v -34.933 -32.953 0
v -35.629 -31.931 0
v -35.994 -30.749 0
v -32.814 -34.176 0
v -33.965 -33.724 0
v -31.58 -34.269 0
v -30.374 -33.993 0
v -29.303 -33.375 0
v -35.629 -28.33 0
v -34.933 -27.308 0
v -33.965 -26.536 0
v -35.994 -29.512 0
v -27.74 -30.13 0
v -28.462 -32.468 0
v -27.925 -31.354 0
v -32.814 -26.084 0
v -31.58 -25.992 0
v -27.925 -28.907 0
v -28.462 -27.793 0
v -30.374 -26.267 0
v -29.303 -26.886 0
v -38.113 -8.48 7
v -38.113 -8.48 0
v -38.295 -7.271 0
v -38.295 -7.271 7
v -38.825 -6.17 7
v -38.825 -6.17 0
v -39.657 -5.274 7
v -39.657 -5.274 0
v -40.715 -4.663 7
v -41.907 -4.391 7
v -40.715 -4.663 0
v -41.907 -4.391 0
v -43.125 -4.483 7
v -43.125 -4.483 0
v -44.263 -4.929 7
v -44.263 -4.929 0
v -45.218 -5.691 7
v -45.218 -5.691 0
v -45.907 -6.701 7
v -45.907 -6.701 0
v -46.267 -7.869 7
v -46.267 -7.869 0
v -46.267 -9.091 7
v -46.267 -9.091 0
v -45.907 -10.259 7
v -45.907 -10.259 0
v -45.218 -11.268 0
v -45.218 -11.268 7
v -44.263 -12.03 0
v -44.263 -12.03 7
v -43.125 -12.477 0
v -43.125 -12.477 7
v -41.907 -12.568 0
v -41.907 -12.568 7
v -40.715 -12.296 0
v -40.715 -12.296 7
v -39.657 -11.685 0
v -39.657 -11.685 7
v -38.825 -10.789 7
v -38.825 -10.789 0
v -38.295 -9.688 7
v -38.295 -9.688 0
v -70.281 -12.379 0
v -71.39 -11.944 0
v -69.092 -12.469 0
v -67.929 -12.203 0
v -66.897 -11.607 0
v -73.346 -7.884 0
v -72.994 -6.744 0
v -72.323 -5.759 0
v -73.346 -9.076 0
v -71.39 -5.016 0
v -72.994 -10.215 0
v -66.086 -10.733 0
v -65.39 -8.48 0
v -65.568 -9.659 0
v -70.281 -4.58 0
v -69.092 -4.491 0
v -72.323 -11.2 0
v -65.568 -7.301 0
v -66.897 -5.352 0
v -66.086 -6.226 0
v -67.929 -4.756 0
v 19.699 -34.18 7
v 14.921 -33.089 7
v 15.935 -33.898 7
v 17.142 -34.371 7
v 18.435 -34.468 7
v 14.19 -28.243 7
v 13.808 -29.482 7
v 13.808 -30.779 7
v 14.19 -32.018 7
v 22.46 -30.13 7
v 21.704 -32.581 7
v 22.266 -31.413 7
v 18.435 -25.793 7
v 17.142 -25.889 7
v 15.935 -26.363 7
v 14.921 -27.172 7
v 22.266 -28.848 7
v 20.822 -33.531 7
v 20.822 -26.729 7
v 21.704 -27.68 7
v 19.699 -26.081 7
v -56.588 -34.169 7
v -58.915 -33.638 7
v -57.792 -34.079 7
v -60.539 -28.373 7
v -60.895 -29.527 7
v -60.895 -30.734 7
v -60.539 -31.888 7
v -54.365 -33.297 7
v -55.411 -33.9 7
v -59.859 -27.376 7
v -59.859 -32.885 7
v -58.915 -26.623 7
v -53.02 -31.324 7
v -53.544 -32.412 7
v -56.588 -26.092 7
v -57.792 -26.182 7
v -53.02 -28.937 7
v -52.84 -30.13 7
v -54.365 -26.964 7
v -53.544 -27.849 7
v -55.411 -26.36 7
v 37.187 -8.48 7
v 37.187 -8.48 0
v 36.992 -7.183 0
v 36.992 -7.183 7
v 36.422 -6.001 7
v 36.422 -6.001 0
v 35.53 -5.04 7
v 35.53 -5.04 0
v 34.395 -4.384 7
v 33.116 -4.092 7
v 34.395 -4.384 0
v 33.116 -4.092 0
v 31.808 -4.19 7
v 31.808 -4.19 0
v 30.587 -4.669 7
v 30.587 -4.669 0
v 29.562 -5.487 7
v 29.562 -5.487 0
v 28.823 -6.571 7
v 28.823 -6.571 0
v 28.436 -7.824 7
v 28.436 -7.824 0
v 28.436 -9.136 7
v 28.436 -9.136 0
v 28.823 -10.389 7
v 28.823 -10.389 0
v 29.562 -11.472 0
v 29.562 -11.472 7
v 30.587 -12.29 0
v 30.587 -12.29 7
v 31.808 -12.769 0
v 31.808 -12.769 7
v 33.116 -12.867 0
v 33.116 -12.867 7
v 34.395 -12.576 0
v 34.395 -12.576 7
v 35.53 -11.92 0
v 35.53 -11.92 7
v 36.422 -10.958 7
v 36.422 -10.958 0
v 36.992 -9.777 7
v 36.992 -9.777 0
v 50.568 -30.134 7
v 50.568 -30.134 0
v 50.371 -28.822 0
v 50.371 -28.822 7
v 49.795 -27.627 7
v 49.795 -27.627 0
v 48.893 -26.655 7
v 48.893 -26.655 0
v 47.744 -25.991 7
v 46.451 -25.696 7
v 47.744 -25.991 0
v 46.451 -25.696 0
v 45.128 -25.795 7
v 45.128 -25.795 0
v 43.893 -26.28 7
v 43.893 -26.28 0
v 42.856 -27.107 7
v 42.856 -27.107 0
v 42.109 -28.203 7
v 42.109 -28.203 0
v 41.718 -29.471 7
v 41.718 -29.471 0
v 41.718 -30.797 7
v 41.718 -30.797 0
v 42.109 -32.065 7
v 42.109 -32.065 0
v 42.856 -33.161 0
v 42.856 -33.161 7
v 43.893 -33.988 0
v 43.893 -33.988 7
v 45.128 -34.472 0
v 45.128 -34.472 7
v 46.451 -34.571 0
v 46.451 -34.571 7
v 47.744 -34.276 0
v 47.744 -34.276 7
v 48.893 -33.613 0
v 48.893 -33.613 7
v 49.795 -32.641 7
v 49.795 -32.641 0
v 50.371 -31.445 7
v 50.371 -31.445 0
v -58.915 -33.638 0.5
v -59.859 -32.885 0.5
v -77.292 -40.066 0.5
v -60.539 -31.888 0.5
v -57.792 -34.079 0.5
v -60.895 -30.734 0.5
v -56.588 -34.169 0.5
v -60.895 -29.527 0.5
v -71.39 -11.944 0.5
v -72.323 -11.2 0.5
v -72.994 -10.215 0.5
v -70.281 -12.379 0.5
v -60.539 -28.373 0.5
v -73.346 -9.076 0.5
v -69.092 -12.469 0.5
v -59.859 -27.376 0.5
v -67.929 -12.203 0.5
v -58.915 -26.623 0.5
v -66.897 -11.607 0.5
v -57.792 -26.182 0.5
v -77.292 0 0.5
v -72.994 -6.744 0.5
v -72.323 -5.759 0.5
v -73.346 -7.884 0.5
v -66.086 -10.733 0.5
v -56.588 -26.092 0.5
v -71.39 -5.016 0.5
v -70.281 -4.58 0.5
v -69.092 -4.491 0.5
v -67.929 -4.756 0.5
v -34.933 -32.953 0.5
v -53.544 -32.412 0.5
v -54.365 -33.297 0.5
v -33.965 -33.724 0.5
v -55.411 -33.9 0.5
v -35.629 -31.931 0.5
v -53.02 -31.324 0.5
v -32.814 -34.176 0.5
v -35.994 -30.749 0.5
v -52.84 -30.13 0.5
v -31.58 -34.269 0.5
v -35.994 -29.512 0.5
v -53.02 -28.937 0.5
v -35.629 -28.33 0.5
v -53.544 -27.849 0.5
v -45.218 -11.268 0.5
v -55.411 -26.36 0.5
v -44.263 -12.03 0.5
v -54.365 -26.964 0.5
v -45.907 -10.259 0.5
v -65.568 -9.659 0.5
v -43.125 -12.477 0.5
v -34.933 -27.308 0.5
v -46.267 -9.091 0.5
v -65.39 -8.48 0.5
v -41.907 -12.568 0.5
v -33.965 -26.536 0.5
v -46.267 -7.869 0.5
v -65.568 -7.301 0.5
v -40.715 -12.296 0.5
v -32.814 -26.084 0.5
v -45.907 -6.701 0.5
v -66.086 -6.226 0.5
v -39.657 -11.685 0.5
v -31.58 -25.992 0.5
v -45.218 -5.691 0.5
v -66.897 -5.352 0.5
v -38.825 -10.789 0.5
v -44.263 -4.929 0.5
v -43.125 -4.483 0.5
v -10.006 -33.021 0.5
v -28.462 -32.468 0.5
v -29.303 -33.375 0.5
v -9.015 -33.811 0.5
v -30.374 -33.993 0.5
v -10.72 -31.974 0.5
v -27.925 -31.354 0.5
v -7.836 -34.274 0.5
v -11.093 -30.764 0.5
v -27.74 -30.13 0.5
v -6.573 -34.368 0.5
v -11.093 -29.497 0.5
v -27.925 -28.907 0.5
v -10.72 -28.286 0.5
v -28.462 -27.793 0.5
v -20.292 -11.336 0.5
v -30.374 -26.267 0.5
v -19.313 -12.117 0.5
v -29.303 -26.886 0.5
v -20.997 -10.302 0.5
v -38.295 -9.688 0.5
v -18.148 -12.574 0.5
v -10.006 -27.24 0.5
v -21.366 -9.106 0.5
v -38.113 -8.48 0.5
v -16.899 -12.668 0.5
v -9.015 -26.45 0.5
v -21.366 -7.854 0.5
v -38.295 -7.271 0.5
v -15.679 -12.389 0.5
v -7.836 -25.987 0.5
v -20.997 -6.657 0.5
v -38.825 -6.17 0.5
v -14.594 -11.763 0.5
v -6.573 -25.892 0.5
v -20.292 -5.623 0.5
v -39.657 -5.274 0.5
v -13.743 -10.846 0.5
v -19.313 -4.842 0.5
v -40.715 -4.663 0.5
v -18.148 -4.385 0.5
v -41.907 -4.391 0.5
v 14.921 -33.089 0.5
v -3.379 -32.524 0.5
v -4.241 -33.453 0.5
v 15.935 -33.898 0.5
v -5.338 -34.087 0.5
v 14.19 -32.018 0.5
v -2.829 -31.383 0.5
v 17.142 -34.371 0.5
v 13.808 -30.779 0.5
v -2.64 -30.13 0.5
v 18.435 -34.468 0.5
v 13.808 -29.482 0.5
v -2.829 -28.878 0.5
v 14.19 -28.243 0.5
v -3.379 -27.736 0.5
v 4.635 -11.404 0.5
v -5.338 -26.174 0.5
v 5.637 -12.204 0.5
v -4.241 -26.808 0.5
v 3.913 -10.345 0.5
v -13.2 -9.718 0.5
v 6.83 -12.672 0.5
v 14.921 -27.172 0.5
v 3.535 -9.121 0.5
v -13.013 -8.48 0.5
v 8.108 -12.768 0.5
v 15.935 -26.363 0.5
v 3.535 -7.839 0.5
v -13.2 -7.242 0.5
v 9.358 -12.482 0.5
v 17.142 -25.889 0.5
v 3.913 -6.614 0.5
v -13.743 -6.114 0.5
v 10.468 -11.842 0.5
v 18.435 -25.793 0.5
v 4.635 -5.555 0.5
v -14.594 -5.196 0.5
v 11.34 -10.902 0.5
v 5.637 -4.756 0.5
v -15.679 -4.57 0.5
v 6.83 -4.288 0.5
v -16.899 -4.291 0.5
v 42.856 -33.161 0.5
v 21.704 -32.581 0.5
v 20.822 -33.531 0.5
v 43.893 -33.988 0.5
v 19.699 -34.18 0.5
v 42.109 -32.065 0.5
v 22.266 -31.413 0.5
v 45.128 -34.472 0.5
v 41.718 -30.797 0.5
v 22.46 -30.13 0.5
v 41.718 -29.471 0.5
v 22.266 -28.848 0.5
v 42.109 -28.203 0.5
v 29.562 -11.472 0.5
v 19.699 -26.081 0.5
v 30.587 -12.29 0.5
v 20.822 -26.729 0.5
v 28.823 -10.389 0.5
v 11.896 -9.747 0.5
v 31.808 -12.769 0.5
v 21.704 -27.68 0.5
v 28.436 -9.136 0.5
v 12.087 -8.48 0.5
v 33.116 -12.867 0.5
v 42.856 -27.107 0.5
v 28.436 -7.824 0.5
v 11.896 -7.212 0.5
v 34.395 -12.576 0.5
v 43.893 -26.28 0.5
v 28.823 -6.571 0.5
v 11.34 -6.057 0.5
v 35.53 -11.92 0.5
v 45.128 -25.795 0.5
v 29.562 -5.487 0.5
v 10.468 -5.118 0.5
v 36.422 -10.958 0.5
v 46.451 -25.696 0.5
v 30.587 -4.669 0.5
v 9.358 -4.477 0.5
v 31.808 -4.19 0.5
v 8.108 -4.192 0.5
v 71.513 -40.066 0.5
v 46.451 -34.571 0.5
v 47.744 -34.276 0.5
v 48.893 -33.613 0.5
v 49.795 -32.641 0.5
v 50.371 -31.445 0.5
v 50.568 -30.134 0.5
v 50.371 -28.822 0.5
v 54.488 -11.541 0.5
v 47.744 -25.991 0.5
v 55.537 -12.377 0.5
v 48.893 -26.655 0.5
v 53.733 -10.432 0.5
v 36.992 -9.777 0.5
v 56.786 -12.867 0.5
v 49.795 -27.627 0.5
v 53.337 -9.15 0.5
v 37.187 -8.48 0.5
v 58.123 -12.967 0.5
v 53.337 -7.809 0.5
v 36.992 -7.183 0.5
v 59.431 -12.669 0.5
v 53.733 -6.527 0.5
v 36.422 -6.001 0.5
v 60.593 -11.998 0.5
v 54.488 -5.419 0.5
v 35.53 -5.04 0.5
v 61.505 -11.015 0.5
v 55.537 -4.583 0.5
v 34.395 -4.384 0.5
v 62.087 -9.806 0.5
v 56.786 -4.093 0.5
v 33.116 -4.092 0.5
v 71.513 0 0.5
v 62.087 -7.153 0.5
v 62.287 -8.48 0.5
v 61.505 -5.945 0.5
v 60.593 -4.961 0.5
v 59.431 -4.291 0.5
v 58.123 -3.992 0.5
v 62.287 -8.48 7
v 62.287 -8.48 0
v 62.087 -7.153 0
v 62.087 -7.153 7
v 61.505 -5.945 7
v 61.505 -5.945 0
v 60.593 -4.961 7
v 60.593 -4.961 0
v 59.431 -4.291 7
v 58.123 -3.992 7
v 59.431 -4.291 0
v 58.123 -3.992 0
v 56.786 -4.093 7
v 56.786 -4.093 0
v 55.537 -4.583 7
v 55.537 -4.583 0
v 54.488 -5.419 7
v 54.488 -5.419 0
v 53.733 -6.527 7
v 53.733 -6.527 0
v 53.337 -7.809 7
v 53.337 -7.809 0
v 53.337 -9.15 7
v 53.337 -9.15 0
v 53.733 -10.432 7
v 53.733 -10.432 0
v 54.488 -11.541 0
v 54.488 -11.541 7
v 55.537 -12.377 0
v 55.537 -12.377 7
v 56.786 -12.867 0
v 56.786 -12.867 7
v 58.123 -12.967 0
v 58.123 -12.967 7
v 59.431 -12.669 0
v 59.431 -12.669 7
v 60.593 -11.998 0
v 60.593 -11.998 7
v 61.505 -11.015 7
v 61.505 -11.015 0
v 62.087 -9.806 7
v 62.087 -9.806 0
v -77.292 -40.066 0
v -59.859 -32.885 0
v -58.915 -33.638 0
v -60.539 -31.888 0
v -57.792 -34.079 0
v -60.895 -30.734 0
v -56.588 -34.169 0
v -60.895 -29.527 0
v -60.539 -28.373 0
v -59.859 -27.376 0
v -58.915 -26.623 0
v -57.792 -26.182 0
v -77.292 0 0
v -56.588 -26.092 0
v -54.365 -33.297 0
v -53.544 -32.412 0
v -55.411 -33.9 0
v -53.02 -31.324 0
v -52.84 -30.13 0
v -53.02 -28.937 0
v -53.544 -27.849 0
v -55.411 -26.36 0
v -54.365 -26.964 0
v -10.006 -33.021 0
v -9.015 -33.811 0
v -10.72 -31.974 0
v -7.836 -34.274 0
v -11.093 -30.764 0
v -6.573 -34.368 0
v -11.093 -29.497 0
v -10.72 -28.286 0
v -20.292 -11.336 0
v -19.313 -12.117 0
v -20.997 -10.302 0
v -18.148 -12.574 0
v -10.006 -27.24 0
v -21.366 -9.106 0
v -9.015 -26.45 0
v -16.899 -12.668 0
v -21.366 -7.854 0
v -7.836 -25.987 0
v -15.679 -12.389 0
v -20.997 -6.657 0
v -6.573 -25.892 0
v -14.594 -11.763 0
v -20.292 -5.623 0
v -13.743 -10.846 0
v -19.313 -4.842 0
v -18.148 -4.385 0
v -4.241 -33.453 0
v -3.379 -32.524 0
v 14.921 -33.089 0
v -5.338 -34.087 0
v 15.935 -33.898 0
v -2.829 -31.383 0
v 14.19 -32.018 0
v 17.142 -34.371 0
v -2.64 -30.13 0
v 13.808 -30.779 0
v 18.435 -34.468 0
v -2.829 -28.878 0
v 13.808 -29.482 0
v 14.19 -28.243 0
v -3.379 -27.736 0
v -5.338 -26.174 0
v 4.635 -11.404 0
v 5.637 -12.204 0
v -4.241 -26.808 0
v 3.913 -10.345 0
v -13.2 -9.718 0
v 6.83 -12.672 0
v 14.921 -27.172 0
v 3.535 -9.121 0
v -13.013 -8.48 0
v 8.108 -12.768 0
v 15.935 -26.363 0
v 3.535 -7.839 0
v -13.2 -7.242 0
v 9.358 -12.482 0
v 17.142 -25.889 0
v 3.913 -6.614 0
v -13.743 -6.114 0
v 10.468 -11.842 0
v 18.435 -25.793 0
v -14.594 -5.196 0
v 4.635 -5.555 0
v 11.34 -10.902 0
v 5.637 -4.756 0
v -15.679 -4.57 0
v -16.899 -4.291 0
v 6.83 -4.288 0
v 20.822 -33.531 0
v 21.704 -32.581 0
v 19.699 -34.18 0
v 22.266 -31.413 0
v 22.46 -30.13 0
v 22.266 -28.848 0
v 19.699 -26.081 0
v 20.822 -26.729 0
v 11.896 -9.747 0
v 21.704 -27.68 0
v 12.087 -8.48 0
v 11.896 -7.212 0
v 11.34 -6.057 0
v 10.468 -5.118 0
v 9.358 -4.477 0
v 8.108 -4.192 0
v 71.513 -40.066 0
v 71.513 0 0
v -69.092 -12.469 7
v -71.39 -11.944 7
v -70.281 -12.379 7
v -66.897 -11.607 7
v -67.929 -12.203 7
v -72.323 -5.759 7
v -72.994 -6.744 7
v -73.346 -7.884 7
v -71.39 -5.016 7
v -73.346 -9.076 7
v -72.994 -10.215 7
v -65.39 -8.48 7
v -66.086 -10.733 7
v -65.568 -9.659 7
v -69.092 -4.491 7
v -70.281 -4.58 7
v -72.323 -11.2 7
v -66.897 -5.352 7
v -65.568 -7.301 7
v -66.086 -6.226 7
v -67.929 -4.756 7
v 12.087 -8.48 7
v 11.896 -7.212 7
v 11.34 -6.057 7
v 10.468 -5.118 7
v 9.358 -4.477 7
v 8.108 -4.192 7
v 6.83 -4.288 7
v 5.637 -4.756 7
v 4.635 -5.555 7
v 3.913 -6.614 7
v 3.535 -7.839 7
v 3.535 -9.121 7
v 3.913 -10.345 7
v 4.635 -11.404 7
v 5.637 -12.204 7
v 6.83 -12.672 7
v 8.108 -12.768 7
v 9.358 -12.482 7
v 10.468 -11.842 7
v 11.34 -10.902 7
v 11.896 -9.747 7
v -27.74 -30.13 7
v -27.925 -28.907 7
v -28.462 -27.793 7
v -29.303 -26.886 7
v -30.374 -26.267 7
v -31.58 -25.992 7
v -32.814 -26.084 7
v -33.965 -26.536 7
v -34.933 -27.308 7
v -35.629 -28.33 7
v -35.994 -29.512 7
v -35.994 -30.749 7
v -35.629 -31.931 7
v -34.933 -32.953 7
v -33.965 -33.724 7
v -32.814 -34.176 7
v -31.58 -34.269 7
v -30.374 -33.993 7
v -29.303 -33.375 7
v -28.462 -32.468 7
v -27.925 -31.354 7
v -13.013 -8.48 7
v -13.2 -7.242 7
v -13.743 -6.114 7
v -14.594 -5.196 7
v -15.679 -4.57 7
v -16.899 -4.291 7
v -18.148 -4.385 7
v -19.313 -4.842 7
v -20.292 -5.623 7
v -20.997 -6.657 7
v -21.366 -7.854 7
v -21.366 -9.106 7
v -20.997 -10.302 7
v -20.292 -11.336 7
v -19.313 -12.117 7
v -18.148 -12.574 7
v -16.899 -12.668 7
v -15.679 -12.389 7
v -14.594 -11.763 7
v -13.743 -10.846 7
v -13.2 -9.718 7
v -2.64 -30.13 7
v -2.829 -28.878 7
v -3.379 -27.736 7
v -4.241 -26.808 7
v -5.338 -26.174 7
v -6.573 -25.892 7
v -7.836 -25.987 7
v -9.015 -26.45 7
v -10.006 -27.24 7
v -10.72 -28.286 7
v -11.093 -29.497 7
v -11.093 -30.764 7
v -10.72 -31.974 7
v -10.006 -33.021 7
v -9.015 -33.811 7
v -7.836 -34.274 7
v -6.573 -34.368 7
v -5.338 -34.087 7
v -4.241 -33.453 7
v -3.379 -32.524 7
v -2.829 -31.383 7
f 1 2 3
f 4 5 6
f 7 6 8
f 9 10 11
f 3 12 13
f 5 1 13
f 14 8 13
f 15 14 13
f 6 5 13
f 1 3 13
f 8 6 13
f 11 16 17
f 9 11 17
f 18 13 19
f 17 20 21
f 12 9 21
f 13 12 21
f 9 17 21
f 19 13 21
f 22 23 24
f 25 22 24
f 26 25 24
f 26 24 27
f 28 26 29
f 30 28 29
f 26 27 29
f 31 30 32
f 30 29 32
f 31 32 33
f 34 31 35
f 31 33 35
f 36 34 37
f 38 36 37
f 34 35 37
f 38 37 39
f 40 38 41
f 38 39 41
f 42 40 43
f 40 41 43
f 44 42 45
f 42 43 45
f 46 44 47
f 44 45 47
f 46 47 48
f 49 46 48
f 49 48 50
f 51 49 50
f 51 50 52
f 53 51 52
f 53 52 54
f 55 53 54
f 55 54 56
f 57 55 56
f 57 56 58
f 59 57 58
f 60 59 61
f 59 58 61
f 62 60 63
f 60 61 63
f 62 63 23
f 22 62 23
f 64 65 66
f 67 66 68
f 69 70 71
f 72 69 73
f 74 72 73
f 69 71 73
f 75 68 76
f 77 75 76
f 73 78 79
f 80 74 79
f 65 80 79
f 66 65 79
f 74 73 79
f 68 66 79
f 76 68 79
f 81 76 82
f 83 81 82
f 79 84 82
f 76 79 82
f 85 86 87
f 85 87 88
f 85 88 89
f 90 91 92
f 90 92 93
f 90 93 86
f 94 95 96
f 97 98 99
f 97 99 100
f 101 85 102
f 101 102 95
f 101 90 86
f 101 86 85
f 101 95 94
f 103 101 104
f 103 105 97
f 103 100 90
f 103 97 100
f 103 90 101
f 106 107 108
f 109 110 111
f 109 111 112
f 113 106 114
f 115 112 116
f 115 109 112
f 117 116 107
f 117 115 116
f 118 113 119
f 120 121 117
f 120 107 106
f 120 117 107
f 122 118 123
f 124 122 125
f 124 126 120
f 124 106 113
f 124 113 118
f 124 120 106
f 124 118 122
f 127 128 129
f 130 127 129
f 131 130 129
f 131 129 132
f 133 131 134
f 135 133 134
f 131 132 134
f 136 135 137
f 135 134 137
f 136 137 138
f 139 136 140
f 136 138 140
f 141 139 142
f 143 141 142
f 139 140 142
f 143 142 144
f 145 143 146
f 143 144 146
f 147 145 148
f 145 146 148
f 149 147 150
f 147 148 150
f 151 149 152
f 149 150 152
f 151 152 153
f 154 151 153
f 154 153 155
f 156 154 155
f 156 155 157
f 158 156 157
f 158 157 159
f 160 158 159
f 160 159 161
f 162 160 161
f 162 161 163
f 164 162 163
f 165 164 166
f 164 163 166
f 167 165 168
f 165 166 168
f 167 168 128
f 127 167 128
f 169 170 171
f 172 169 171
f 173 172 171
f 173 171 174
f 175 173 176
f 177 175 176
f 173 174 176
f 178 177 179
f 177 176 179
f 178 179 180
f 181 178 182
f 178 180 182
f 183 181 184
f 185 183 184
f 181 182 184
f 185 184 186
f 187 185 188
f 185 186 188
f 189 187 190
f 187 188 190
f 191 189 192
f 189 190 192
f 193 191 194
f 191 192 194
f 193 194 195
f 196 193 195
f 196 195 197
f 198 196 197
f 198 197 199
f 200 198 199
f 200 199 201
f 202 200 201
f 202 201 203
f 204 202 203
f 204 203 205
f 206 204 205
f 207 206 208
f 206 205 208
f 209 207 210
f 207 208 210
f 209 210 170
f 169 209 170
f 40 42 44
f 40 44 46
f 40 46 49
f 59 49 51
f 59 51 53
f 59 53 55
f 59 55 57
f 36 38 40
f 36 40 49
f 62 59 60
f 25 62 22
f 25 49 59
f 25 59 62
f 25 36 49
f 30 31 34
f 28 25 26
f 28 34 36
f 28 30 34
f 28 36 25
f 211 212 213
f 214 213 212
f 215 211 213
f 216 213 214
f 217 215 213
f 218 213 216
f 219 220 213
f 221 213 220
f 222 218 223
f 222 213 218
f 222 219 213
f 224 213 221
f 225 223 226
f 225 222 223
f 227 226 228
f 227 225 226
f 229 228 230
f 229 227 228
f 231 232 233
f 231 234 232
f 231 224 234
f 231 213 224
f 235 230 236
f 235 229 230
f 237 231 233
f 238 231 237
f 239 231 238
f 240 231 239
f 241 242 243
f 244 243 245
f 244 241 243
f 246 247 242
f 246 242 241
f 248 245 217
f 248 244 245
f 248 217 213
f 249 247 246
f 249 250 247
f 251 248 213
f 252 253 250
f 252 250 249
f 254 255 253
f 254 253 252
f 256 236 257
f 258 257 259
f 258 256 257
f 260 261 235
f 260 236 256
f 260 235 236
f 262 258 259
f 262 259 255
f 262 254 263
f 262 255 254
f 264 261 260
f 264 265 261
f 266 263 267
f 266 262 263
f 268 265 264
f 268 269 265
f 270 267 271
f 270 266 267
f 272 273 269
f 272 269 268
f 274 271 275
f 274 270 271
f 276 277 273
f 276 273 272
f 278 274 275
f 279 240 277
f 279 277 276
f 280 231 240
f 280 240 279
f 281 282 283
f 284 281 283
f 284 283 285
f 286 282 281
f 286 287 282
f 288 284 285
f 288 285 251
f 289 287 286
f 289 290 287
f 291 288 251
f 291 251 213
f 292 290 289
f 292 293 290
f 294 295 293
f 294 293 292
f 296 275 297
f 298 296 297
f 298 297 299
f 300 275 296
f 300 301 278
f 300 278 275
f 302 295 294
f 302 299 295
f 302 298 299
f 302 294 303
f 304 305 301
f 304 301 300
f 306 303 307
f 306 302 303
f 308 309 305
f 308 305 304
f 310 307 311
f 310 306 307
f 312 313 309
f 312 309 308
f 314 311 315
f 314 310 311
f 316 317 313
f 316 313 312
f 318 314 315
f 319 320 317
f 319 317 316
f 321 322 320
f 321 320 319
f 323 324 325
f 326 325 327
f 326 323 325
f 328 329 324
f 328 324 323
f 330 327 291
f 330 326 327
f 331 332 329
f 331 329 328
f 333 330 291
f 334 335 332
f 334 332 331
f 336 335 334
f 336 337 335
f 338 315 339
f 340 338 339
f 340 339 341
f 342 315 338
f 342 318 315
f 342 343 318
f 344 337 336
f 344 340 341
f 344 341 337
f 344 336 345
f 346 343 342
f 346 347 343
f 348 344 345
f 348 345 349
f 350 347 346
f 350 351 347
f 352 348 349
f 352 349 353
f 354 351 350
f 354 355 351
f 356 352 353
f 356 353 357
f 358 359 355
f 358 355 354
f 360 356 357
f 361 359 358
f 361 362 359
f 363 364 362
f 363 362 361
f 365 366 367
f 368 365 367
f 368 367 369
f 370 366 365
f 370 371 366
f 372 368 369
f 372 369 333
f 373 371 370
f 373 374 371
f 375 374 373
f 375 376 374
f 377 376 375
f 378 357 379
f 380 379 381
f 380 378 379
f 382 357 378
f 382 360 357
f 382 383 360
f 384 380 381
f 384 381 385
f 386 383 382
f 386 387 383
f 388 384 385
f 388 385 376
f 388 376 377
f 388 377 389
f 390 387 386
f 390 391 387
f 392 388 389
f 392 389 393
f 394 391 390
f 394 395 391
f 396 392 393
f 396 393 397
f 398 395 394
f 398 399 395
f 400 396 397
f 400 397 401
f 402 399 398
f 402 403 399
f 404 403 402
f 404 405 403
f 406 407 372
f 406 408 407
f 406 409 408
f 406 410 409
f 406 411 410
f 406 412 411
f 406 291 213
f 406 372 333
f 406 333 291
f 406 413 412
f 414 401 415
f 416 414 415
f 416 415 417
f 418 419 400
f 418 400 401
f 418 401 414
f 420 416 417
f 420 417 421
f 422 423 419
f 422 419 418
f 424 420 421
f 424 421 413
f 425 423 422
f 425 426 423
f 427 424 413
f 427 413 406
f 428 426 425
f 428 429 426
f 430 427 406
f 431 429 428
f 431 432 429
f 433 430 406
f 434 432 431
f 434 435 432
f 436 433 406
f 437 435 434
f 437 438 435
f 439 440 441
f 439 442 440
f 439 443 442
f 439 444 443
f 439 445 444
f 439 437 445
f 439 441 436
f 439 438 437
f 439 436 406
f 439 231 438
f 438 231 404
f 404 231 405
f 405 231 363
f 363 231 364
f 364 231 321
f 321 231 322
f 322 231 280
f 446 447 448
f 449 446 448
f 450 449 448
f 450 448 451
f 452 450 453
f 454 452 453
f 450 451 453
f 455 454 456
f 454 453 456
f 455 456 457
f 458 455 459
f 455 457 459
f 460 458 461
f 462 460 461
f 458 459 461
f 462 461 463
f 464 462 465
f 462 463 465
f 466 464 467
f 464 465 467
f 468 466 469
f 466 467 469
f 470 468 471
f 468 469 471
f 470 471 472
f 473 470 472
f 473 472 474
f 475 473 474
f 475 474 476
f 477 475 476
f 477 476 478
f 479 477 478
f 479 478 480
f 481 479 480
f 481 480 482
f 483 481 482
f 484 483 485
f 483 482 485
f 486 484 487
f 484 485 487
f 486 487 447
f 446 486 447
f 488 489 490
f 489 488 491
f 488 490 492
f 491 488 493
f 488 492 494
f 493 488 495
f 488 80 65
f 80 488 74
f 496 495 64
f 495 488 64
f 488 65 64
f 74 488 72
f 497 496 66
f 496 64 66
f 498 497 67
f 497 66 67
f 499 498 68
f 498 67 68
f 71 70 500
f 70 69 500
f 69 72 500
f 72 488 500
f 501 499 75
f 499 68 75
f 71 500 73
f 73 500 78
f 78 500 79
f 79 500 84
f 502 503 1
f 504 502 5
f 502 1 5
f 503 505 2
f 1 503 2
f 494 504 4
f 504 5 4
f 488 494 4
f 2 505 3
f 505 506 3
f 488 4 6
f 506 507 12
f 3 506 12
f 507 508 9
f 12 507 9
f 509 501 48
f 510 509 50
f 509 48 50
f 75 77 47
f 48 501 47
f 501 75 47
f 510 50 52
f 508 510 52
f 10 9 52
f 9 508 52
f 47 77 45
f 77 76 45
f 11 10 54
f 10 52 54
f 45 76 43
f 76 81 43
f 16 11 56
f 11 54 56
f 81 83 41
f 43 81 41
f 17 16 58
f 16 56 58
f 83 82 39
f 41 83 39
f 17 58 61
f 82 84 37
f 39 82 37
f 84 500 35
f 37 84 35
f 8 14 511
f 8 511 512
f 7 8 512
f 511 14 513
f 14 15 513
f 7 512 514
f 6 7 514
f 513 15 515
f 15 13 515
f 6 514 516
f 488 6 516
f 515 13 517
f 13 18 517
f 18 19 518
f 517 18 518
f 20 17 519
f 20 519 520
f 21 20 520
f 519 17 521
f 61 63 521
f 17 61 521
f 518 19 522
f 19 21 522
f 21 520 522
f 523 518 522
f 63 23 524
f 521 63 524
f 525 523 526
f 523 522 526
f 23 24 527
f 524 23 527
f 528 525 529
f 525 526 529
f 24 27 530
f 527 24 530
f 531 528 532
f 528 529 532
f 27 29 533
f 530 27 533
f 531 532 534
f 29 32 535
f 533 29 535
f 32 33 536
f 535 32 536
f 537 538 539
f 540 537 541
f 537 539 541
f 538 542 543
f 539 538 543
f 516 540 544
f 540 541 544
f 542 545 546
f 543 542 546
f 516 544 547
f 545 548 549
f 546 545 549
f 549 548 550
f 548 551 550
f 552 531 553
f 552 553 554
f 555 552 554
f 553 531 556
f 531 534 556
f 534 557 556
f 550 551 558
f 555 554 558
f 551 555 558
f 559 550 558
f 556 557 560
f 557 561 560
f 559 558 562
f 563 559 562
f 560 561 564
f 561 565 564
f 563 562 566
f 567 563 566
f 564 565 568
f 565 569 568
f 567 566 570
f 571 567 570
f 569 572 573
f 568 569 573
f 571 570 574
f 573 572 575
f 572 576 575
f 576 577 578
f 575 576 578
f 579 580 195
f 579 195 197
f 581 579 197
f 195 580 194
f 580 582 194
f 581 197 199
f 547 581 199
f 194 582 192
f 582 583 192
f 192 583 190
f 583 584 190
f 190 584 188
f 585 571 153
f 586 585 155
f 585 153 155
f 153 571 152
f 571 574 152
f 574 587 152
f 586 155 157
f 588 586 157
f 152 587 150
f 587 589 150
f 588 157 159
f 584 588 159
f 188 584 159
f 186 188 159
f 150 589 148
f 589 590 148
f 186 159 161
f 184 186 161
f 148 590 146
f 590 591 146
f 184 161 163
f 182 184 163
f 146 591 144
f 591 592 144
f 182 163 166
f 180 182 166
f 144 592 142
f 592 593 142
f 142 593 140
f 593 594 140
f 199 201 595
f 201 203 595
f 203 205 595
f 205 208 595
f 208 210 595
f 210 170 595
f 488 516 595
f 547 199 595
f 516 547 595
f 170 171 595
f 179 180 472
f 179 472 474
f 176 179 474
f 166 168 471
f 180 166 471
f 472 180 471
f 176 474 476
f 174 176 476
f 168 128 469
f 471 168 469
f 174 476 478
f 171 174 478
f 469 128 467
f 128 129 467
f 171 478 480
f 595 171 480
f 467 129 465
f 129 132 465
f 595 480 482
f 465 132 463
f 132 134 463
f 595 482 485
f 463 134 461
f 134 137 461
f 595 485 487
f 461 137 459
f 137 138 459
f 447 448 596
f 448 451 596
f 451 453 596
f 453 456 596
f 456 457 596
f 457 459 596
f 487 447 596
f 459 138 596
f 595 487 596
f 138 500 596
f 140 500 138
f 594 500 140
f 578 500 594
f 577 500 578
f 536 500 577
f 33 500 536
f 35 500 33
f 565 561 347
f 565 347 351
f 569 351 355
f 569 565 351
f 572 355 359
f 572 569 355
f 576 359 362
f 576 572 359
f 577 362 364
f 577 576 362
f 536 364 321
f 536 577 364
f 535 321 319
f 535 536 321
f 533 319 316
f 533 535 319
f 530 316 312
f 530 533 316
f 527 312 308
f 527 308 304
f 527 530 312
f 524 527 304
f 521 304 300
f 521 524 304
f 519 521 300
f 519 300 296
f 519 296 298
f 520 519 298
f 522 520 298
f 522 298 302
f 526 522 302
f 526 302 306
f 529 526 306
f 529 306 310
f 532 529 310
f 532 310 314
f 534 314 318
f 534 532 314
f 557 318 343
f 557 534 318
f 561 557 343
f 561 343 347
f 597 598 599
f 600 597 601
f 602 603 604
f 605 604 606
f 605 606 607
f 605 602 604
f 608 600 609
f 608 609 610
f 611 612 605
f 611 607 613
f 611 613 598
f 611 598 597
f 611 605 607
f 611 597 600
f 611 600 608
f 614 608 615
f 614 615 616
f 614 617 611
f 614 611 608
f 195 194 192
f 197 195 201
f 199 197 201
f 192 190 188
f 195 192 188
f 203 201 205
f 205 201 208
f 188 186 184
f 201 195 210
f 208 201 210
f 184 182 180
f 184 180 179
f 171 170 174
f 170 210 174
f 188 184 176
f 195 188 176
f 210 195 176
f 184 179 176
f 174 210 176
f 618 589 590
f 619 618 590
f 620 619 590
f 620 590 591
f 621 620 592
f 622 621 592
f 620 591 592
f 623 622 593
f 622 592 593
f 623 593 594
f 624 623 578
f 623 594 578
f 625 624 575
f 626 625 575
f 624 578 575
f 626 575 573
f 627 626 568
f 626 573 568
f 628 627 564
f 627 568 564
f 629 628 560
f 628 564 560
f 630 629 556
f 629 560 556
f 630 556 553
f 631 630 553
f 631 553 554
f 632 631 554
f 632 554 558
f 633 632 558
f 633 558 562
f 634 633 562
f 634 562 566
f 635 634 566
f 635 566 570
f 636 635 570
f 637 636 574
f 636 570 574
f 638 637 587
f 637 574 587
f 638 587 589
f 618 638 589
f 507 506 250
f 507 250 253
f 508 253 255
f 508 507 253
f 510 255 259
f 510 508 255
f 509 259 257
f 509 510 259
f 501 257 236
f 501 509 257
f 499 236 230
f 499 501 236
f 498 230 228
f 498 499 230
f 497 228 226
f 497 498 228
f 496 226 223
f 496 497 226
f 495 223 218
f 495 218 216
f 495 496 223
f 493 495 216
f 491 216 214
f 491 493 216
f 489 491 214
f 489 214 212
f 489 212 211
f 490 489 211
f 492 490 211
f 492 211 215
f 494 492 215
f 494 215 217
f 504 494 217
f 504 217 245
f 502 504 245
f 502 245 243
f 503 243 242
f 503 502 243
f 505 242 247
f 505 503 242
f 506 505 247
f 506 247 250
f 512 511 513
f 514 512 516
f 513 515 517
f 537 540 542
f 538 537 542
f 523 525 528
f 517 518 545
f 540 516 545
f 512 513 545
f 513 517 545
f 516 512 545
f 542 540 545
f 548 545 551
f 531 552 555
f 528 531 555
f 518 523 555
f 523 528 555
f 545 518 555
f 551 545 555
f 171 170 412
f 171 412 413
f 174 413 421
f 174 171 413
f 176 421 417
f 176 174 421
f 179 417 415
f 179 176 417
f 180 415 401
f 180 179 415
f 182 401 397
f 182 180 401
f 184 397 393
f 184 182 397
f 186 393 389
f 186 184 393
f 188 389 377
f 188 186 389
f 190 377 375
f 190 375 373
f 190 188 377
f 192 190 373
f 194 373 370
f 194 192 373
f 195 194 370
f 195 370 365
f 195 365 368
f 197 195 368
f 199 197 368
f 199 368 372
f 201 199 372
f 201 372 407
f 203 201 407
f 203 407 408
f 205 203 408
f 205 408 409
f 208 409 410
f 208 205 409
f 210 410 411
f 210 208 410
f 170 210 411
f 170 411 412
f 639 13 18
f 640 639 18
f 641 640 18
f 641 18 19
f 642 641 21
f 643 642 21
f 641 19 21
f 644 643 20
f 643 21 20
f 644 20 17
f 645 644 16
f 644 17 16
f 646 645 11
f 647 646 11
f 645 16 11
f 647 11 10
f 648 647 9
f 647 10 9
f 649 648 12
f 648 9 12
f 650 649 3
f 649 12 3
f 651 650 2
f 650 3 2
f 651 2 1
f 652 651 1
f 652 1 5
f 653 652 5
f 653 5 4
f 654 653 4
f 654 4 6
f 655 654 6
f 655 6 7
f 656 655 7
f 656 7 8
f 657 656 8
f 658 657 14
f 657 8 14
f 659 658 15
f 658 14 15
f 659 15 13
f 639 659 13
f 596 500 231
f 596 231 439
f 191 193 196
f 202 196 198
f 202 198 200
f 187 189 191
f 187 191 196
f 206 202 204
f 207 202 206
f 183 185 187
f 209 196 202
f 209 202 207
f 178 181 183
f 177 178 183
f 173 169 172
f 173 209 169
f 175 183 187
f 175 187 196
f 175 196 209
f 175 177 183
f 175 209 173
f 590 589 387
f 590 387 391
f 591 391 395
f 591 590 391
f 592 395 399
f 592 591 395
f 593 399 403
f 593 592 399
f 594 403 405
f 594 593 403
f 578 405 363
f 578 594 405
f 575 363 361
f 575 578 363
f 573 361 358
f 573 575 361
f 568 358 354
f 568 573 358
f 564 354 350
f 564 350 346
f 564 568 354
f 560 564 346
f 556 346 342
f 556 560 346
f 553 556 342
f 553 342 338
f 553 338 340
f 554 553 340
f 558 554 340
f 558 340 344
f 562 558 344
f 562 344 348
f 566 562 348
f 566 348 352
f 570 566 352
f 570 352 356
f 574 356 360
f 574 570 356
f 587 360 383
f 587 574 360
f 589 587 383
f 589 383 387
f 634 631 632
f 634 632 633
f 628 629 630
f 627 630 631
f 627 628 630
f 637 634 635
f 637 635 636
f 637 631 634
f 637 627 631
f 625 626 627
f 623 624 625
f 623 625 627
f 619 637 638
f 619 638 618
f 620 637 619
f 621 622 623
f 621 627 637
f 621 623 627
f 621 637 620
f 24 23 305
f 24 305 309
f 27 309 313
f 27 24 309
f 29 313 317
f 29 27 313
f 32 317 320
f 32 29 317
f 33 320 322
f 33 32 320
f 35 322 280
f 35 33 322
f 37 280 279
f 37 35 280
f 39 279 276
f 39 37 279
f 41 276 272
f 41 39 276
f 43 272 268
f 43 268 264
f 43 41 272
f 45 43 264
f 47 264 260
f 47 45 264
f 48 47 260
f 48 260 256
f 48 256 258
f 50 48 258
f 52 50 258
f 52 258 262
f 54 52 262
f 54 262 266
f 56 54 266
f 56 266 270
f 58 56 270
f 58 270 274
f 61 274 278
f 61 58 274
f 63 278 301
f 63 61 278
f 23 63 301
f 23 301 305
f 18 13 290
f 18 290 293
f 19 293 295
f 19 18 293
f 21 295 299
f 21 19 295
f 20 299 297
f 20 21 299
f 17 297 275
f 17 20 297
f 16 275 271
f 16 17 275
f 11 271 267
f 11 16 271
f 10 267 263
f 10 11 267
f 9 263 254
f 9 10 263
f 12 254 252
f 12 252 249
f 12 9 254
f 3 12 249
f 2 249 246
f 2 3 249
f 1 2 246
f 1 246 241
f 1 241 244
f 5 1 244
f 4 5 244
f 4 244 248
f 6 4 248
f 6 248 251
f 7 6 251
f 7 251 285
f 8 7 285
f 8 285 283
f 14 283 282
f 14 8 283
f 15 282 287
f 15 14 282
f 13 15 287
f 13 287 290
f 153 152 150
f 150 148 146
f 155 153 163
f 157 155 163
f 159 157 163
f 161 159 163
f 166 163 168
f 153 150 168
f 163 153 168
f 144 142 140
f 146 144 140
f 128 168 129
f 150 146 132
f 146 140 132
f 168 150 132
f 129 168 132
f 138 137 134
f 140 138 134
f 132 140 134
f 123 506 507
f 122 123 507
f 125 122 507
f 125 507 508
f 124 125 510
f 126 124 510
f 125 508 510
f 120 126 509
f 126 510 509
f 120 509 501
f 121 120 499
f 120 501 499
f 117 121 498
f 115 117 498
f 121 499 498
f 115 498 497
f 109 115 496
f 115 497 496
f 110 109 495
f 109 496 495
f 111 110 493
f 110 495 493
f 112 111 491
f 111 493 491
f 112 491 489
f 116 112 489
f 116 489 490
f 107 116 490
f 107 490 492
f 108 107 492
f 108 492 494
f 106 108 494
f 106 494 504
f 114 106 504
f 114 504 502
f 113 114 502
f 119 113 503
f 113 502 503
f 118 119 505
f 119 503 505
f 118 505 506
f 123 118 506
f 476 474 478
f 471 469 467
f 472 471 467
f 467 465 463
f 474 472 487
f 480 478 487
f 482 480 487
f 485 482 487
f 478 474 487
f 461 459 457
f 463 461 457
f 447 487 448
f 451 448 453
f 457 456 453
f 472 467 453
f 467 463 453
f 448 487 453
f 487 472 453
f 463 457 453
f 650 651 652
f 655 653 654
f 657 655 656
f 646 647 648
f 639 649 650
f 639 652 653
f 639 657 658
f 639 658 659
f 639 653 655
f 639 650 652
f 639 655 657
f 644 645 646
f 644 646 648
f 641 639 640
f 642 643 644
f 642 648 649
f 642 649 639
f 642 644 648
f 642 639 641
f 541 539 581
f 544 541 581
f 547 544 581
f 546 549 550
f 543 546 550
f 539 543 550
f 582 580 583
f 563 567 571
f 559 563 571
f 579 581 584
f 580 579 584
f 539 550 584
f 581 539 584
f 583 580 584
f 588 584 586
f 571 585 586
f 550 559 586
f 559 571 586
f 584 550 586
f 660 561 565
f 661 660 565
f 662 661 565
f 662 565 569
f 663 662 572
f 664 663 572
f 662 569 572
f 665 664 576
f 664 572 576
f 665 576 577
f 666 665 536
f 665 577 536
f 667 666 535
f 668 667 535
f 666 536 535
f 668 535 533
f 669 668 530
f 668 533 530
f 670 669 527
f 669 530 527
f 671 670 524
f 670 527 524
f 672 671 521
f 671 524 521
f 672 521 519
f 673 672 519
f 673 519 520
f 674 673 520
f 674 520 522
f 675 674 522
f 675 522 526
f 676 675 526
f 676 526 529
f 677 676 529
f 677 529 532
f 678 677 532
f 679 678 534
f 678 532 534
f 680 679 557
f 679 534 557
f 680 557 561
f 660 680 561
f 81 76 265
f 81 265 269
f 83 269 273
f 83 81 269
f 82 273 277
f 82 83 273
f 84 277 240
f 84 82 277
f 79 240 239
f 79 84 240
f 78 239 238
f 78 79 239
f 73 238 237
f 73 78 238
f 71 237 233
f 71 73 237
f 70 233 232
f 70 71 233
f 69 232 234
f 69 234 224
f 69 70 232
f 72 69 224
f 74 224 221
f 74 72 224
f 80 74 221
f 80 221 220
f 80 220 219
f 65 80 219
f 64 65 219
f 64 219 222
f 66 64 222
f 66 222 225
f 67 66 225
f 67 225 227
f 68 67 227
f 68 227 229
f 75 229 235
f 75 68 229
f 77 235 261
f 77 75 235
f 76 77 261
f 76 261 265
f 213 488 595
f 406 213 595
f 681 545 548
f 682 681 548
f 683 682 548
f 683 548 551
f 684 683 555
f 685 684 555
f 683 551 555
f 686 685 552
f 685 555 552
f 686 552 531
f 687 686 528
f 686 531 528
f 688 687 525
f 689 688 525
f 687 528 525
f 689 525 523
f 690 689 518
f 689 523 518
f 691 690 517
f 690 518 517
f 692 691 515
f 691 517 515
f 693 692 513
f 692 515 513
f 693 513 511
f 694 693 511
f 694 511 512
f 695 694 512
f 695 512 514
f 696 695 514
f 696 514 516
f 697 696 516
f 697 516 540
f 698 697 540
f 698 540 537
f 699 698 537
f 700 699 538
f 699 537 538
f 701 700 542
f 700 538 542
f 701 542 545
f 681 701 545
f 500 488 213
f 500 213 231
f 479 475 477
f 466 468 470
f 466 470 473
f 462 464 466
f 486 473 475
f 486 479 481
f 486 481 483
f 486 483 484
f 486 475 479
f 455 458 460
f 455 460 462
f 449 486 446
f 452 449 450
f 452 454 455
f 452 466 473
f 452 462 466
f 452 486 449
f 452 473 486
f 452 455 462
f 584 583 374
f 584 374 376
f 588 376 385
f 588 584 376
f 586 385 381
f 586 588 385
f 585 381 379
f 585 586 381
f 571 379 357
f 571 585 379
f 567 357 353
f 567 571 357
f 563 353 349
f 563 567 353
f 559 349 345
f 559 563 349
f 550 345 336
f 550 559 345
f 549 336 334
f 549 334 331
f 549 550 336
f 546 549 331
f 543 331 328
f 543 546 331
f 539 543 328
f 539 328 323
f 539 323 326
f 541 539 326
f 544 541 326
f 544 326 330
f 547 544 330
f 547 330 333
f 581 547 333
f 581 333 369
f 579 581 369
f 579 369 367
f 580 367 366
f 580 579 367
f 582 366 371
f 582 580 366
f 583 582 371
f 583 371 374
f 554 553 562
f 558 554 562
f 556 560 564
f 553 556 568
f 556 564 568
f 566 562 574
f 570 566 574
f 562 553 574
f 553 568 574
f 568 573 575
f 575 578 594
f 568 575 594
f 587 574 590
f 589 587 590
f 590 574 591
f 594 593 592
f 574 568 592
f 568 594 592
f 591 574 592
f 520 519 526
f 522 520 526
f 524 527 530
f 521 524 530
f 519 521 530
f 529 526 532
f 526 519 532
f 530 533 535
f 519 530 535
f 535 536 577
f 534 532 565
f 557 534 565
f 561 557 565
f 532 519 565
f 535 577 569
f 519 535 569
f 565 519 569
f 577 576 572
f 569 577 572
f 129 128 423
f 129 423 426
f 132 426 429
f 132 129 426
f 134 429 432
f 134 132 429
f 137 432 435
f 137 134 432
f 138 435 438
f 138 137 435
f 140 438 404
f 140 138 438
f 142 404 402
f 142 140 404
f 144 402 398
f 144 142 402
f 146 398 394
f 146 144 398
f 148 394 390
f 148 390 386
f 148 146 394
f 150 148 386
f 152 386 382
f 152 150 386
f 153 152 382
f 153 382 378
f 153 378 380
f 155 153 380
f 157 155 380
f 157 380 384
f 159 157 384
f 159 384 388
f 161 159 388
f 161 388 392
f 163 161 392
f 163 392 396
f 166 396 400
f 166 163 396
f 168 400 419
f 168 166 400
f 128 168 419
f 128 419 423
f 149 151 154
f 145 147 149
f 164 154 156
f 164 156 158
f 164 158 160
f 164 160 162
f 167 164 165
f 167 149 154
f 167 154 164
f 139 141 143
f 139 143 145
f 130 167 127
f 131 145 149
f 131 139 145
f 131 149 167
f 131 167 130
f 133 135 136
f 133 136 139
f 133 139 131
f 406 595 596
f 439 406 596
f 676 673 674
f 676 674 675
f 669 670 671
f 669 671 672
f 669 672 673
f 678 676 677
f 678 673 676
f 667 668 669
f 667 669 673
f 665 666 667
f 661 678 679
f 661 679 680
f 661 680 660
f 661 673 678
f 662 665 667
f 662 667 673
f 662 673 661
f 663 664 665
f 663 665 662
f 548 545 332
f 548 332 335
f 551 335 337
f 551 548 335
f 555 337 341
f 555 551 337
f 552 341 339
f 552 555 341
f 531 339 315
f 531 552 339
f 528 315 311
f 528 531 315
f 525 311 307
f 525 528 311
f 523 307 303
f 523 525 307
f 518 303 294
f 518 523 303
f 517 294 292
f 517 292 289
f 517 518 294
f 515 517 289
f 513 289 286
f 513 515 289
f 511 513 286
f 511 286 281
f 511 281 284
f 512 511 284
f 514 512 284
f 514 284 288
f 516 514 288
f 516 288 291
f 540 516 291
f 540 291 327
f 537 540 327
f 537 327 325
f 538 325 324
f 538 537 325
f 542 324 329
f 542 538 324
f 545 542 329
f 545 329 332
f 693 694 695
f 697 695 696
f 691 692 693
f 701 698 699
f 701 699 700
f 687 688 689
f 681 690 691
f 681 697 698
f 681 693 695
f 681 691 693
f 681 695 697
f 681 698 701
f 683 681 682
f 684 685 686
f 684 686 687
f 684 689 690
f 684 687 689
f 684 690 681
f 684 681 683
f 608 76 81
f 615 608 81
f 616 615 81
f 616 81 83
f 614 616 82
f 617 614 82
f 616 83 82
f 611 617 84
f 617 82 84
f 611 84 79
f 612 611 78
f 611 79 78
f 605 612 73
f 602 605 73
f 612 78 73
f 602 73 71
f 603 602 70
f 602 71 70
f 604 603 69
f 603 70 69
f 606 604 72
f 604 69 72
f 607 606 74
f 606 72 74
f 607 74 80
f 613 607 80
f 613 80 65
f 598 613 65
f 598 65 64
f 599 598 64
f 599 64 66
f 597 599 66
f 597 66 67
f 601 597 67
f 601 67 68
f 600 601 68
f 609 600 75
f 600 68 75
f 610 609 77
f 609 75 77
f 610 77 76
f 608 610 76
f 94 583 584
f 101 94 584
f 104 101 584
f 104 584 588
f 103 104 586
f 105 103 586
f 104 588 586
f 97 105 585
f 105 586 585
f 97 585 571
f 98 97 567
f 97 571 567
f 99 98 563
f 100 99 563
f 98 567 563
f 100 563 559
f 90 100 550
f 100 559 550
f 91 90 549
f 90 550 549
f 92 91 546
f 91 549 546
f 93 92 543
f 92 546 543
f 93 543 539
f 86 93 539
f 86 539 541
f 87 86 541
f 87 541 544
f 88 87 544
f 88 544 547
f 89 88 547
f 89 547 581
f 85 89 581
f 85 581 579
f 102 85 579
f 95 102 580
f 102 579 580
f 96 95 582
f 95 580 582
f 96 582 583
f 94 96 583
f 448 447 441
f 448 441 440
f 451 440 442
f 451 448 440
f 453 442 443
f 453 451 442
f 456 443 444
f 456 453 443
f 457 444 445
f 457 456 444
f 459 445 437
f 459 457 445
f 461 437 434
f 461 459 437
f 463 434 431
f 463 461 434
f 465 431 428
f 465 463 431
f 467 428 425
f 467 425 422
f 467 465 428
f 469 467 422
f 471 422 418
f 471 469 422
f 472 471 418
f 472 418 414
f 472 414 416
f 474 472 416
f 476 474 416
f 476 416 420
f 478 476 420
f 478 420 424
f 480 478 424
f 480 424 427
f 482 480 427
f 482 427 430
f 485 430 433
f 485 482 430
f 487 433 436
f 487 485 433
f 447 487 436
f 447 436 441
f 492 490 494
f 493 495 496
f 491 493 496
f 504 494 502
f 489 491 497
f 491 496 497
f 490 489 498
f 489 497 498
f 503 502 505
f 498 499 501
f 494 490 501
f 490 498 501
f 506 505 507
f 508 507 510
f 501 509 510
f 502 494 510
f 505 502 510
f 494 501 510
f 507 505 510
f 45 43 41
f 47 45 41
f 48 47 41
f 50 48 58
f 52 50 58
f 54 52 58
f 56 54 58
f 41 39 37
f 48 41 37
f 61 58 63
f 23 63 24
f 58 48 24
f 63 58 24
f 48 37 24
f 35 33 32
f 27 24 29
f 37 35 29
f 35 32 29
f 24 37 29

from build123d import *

# Parameters (mm, degrees)
F0_R     = 4.05
F0_R_2   = 4.15
F0_R_3   = 4
F0_R_4   = 4.1
F0_R_5   = 4.2
F0_R_6   = 4.25
F0_R_7   = 4.35
F0_R_8   = 4.3
F0_R_9   = 4.4
F0_R_10  = 4.45
F0_R_11  = 4.5
F1_DEPTH = 7
F0_W     = 148.804592
F0_H     = 40.065791
F2_DEPTH = 0.5


with BuildPart() as f1:
    # F0 (on Top) → F1 (new body)
    with BuildSketch(Plane.XY):
        with Locations((-56.89046, -30.130364)):
            Circle(F0_R)
        with Locations((-31.89046, -30.130364)):
            Circle(F0_R_2)
        with Locations((-69.39046, -8.479729)):
            Circle(F0_R_3)
        with Locations((-42.212952, -8.479729)):
            Circle(F0_R_4)
        with Locations((-17.212952, -8.479729)):
            Circle(F0_R_5)
        with Locations((-6.89046, -30.130364)):
            Circle(F0_R_6)
        with Locations((18.10954, -30.130364)):
            Circle(F0_R_7)
        with Locations((7.787048, -8.479729)):
            Circle(F0_R_8)
        with Locations((32.787048, -8.479729)):
            Circle(F0_R_9)
        with Locations((46.118356, -30.133799)):
            Circle(F0_R_10)
        with Locations((57.787048, -8.479729)):
            Circle(F0_R_11)
    extrude(amount=F1_DEPTH)


with BuildPart() as f2:
    # F0 (on Top) → F2 (new body)
    with BuildSketch(Plane.XY):
        with Locations((-2.889595, -20.032895)):
            Rectangle(F0_W, F0_H)
        with Locations((-56.89046, -30.130364)):
            Circle(F0_R, mode=Mode.SUBTRACT)
        with Locations((-31.89046, -30.130364)):
            Circle(F0_R_2, mode=Mode.SUBTRACT)
        with Locations((-6.89046, -30.130364)):
            Circle(F0_R_6, mode=Mode.SUBTRACT)
        with Locations((18.10954, -30.130364)):
            Circle(F0_R_7, mode=Mode.SUBTRACT)
        with Locations((46.118356, -30.133799)):
            Circle(F0_R_10, mode=Mode.SUBTRACT)
        with Locations((-69.39046, -8.479729)):
            Circle(F0_R_3, mode=Mode.SUBTRACT)
        with Locations((-42.212952, -8.479729)):
            Circle(F0_R_4, mode=Mode.SUBTRACT)
        with Locations((-17.212952, -8.479729)):
            Circle(F0_R_5, mode=Mode.SUBTRACT)
        with Locations((7.787048, -8.479729)):
            Circle(F0_R_8, mode=Mode.SUBTRACT)
        with Locations((32.787048, -8.479729)):
            Circle(F0_R_9, mode=Mode.SUBTRACT)
        with Locations((57.787048, -8.479729)):
            Circle(F0_R_11, mode=Mode.SUBTRACT)
    extrude(amount=F2_DEPTH)


solid = Compound([f1.part, f2.part])
